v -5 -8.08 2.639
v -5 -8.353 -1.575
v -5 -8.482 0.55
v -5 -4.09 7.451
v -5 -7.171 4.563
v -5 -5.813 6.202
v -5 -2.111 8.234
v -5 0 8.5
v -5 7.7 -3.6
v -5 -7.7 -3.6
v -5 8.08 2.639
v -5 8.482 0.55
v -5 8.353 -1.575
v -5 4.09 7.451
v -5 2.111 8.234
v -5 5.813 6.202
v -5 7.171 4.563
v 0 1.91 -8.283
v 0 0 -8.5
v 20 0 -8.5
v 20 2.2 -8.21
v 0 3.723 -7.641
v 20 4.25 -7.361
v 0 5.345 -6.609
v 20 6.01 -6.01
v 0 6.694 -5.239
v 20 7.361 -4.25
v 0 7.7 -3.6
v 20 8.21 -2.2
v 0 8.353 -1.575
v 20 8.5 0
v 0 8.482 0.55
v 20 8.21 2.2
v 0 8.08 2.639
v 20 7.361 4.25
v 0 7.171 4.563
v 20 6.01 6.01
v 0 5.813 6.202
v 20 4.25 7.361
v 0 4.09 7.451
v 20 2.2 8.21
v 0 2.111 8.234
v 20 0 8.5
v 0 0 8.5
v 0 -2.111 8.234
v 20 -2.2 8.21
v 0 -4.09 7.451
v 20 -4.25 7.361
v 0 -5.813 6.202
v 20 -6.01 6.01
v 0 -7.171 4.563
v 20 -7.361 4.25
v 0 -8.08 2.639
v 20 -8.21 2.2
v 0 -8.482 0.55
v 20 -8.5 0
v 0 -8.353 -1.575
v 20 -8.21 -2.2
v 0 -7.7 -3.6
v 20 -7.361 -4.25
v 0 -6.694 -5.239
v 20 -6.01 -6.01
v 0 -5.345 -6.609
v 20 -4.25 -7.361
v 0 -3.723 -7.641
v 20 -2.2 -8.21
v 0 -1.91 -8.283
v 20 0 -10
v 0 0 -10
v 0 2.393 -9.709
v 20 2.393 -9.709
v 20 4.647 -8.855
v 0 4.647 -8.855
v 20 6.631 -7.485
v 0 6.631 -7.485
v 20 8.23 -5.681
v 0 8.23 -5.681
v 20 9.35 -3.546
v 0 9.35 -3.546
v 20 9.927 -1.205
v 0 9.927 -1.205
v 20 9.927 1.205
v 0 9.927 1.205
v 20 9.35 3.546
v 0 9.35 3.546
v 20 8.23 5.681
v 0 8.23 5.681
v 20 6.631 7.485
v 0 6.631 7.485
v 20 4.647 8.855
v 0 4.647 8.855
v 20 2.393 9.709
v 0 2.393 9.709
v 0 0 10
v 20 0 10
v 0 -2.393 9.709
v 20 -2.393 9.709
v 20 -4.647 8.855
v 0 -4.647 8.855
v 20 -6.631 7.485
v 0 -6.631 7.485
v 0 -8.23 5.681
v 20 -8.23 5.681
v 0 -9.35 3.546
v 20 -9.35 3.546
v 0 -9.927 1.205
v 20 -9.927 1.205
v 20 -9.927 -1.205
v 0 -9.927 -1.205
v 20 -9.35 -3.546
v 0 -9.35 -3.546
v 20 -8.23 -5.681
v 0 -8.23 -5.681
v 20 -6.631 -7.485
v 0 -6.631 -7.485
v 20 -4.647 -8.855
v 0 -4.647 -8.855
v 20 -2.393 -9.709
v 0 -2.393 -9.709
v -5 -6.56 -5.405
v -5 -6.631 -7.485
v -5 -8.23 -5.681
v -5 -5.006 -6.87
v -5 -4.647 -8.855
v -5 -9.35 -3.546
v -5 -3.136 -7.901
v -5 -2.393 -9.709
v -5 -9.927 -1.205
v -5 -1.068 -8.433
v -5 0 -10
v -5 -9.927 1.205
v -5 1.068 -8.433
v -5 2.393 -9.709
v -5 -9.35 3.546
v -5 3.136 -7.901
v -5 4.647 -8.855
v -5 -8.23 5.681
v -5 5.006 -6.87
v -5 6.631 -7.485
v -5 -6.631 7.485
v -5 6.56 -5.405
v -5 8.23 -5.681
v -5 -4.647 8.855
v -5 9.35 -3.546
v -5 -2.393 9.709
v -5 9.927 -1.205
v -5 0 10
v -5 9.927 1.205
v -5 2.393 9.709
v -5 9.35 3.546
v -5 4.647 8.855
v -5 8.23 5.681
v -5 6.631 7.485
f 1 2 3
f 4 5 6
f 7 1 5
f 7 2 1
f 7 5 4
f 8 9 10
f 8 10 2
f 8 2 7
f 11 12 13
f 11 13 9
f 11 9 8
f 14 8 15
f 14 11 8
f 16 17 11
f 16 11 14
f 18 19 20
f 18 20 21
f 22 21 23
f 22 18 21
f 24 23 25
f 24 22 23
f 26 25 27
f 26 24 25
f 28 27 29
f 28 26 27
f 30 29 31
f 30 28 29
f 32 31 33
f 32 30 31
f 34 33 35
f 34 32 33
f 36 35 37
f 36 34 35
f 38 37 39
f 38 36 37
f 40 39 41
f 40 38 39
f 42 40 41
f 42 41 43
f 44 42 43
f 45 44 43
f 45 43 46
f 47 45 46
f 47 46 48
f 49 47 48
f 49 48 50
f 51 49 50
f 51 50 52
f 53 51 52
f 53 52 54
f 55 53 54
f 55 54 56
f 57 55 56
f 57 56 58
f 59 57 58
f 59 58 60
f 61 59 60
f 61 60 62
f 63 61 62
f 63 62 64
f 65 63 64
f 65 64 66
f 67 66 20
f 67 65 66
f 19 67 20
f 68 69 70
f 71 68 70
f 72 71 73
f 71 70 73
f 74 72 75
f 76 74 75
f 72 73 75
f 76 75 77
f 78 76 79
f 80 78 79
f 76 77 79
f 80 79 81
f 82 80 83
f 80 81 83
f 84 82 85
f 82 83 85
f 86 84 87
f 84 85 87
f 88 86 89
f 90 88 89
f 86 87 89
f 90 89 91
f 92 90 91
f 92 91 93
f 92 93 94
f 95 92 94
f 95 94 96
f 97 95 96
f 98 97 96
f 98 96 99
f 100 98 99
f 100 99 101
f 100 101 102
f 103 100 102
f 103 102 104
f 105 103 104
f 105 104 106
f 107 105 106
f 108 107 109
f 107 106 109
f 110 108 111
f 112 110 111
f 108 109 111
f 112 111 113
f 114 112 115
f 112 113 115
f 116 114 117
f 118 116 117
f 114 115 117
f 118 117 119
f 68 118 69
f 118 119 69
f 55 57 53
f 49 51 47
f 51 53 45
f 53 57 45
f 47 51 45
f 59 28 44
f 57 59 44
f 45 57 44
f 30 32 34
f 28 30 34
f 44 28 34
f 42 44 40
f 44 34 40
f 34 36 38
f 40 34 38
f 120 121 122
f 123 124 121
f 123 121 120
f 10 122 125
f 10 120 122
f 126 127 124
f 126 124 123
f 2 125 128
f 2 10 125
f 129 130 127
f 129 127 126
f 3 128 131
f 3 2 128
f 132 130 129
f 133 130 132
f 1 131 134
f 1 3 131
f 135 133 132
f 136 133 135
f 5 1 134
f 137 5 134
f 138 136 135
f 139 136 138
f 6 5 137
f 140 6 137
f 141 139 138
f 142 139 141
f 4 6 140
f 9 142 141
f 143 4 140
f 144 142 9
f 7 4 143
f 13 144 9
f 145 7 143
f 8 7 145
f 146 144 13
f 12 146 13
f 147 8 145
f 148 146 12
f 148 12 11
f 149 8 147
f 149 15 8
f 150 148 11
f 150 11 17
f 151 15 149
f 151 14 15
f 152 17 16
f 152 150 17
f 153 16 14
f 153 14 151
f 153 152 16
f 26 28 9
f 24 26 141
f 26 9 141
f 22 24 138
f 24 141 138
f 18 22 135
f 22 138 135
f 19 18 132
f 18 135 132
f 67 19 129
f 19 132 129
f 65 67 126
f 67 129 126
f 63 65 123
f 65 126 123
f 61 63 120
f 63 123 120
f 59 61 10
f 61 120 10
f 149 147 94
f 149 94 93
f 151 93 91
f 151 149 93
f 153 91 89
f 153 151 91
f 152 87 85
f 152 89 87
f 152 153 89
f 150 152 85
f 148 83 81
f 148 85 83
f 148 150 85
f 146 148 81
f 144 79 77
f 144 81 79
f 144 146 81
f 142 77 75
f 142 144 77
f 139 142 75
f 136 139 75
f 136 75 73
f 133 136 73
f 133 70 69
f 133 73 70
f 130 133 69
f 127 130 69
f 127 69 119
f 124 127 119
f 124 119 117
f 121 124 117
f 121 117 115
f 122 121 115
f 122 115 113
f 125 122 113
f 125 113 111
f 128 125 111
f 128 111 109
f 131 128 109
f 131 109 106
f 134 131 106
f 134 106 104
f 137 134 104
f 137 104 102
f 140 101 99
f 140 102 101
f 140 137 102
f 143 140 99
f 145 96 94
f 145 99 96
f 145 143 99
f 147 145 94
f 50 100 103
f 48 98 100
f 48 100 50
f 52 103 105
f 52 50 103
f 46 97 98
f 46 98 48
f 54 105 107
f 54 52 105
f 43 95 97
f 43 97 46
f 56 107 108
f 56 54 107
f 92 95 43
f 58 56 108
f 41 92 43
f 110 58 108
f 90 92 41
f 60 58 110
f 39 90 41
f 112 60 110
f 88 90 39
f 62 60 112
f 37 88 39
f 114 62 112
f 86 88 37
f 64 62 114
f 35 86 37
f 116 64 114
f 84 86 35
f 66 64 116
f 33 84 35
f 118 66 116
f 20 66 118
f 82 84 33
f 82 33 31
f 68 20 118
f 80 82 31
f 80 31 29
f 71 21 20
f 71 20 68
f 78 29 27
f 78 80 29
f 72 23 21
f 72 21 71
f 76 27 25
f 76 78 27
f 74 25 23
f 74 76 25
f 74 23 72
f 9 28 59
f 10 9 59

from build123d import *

# Parameters (mm, degrees)
SKETCH_1_R      = 10
SKETCH_1_R_2    = 8.5
EXTRUDE_1_DEPTH = 20
EXTRUDE_7_DEPTH = 5
EXTRUDE_START   = 5
SKETCH_4_R      = 10
SKETCH_4_R_2    = 8.5
EXTRUDE_8_DEPTH = 5


with BuildPart() as part:
    # 草圖1 → 填料-伸長1 (new body)
    with BuildSketch(Plane(origin=(0, 0, 0), x_dir=(0, 0, -1), z_dir=(1, 0, 0))):
        Circle(SKETCH_1_R)
        Circle(SKETCH_1_R_2, mode=Mode.SUBTRACT)
    extrude(amount=EXTRUDE_1_DEPTH)



with BuildPart() as body_2:
    # 草圖2 → 填料-伸長7 (new body)
    with BuildSketch(Plane.ZY):
        with BuildLine():
            ThreePointArc((8.5, 0), (4.563441684, 7.171122646), (-3.6, 7.7))
            Line((-3.6, 7.7), (-3.6, 0))
            Line((-3.6, 0), (-3.6, -7.7))
            ThreePointArc((-3.6, -7.7), (4.563441684, -7.171122646), (8.5, 0))
        make_face()
    extrude(amount=EXTRUDE_7_DEPTH)


with BuildPart() as part_1:
    add(part.part)

    add(body_2.part)  # 填料-伸長8 merges body 2
    # 草圖4 → 填料-伸長8 (add)
    with BuildSketch(Plane.ZY.offset(EXTRUDE_START)):
        Circle(SKETCH_4_R)
        with Locations(Location((0, 0, 0), (0, 0, 244.942384582))):
            Circle(SKETCH_4_R_2, mode=Mode.SUBTRACT)
    extrude(amount=-EXTRUDE_8_DEPTH)


solid = part_1.part
